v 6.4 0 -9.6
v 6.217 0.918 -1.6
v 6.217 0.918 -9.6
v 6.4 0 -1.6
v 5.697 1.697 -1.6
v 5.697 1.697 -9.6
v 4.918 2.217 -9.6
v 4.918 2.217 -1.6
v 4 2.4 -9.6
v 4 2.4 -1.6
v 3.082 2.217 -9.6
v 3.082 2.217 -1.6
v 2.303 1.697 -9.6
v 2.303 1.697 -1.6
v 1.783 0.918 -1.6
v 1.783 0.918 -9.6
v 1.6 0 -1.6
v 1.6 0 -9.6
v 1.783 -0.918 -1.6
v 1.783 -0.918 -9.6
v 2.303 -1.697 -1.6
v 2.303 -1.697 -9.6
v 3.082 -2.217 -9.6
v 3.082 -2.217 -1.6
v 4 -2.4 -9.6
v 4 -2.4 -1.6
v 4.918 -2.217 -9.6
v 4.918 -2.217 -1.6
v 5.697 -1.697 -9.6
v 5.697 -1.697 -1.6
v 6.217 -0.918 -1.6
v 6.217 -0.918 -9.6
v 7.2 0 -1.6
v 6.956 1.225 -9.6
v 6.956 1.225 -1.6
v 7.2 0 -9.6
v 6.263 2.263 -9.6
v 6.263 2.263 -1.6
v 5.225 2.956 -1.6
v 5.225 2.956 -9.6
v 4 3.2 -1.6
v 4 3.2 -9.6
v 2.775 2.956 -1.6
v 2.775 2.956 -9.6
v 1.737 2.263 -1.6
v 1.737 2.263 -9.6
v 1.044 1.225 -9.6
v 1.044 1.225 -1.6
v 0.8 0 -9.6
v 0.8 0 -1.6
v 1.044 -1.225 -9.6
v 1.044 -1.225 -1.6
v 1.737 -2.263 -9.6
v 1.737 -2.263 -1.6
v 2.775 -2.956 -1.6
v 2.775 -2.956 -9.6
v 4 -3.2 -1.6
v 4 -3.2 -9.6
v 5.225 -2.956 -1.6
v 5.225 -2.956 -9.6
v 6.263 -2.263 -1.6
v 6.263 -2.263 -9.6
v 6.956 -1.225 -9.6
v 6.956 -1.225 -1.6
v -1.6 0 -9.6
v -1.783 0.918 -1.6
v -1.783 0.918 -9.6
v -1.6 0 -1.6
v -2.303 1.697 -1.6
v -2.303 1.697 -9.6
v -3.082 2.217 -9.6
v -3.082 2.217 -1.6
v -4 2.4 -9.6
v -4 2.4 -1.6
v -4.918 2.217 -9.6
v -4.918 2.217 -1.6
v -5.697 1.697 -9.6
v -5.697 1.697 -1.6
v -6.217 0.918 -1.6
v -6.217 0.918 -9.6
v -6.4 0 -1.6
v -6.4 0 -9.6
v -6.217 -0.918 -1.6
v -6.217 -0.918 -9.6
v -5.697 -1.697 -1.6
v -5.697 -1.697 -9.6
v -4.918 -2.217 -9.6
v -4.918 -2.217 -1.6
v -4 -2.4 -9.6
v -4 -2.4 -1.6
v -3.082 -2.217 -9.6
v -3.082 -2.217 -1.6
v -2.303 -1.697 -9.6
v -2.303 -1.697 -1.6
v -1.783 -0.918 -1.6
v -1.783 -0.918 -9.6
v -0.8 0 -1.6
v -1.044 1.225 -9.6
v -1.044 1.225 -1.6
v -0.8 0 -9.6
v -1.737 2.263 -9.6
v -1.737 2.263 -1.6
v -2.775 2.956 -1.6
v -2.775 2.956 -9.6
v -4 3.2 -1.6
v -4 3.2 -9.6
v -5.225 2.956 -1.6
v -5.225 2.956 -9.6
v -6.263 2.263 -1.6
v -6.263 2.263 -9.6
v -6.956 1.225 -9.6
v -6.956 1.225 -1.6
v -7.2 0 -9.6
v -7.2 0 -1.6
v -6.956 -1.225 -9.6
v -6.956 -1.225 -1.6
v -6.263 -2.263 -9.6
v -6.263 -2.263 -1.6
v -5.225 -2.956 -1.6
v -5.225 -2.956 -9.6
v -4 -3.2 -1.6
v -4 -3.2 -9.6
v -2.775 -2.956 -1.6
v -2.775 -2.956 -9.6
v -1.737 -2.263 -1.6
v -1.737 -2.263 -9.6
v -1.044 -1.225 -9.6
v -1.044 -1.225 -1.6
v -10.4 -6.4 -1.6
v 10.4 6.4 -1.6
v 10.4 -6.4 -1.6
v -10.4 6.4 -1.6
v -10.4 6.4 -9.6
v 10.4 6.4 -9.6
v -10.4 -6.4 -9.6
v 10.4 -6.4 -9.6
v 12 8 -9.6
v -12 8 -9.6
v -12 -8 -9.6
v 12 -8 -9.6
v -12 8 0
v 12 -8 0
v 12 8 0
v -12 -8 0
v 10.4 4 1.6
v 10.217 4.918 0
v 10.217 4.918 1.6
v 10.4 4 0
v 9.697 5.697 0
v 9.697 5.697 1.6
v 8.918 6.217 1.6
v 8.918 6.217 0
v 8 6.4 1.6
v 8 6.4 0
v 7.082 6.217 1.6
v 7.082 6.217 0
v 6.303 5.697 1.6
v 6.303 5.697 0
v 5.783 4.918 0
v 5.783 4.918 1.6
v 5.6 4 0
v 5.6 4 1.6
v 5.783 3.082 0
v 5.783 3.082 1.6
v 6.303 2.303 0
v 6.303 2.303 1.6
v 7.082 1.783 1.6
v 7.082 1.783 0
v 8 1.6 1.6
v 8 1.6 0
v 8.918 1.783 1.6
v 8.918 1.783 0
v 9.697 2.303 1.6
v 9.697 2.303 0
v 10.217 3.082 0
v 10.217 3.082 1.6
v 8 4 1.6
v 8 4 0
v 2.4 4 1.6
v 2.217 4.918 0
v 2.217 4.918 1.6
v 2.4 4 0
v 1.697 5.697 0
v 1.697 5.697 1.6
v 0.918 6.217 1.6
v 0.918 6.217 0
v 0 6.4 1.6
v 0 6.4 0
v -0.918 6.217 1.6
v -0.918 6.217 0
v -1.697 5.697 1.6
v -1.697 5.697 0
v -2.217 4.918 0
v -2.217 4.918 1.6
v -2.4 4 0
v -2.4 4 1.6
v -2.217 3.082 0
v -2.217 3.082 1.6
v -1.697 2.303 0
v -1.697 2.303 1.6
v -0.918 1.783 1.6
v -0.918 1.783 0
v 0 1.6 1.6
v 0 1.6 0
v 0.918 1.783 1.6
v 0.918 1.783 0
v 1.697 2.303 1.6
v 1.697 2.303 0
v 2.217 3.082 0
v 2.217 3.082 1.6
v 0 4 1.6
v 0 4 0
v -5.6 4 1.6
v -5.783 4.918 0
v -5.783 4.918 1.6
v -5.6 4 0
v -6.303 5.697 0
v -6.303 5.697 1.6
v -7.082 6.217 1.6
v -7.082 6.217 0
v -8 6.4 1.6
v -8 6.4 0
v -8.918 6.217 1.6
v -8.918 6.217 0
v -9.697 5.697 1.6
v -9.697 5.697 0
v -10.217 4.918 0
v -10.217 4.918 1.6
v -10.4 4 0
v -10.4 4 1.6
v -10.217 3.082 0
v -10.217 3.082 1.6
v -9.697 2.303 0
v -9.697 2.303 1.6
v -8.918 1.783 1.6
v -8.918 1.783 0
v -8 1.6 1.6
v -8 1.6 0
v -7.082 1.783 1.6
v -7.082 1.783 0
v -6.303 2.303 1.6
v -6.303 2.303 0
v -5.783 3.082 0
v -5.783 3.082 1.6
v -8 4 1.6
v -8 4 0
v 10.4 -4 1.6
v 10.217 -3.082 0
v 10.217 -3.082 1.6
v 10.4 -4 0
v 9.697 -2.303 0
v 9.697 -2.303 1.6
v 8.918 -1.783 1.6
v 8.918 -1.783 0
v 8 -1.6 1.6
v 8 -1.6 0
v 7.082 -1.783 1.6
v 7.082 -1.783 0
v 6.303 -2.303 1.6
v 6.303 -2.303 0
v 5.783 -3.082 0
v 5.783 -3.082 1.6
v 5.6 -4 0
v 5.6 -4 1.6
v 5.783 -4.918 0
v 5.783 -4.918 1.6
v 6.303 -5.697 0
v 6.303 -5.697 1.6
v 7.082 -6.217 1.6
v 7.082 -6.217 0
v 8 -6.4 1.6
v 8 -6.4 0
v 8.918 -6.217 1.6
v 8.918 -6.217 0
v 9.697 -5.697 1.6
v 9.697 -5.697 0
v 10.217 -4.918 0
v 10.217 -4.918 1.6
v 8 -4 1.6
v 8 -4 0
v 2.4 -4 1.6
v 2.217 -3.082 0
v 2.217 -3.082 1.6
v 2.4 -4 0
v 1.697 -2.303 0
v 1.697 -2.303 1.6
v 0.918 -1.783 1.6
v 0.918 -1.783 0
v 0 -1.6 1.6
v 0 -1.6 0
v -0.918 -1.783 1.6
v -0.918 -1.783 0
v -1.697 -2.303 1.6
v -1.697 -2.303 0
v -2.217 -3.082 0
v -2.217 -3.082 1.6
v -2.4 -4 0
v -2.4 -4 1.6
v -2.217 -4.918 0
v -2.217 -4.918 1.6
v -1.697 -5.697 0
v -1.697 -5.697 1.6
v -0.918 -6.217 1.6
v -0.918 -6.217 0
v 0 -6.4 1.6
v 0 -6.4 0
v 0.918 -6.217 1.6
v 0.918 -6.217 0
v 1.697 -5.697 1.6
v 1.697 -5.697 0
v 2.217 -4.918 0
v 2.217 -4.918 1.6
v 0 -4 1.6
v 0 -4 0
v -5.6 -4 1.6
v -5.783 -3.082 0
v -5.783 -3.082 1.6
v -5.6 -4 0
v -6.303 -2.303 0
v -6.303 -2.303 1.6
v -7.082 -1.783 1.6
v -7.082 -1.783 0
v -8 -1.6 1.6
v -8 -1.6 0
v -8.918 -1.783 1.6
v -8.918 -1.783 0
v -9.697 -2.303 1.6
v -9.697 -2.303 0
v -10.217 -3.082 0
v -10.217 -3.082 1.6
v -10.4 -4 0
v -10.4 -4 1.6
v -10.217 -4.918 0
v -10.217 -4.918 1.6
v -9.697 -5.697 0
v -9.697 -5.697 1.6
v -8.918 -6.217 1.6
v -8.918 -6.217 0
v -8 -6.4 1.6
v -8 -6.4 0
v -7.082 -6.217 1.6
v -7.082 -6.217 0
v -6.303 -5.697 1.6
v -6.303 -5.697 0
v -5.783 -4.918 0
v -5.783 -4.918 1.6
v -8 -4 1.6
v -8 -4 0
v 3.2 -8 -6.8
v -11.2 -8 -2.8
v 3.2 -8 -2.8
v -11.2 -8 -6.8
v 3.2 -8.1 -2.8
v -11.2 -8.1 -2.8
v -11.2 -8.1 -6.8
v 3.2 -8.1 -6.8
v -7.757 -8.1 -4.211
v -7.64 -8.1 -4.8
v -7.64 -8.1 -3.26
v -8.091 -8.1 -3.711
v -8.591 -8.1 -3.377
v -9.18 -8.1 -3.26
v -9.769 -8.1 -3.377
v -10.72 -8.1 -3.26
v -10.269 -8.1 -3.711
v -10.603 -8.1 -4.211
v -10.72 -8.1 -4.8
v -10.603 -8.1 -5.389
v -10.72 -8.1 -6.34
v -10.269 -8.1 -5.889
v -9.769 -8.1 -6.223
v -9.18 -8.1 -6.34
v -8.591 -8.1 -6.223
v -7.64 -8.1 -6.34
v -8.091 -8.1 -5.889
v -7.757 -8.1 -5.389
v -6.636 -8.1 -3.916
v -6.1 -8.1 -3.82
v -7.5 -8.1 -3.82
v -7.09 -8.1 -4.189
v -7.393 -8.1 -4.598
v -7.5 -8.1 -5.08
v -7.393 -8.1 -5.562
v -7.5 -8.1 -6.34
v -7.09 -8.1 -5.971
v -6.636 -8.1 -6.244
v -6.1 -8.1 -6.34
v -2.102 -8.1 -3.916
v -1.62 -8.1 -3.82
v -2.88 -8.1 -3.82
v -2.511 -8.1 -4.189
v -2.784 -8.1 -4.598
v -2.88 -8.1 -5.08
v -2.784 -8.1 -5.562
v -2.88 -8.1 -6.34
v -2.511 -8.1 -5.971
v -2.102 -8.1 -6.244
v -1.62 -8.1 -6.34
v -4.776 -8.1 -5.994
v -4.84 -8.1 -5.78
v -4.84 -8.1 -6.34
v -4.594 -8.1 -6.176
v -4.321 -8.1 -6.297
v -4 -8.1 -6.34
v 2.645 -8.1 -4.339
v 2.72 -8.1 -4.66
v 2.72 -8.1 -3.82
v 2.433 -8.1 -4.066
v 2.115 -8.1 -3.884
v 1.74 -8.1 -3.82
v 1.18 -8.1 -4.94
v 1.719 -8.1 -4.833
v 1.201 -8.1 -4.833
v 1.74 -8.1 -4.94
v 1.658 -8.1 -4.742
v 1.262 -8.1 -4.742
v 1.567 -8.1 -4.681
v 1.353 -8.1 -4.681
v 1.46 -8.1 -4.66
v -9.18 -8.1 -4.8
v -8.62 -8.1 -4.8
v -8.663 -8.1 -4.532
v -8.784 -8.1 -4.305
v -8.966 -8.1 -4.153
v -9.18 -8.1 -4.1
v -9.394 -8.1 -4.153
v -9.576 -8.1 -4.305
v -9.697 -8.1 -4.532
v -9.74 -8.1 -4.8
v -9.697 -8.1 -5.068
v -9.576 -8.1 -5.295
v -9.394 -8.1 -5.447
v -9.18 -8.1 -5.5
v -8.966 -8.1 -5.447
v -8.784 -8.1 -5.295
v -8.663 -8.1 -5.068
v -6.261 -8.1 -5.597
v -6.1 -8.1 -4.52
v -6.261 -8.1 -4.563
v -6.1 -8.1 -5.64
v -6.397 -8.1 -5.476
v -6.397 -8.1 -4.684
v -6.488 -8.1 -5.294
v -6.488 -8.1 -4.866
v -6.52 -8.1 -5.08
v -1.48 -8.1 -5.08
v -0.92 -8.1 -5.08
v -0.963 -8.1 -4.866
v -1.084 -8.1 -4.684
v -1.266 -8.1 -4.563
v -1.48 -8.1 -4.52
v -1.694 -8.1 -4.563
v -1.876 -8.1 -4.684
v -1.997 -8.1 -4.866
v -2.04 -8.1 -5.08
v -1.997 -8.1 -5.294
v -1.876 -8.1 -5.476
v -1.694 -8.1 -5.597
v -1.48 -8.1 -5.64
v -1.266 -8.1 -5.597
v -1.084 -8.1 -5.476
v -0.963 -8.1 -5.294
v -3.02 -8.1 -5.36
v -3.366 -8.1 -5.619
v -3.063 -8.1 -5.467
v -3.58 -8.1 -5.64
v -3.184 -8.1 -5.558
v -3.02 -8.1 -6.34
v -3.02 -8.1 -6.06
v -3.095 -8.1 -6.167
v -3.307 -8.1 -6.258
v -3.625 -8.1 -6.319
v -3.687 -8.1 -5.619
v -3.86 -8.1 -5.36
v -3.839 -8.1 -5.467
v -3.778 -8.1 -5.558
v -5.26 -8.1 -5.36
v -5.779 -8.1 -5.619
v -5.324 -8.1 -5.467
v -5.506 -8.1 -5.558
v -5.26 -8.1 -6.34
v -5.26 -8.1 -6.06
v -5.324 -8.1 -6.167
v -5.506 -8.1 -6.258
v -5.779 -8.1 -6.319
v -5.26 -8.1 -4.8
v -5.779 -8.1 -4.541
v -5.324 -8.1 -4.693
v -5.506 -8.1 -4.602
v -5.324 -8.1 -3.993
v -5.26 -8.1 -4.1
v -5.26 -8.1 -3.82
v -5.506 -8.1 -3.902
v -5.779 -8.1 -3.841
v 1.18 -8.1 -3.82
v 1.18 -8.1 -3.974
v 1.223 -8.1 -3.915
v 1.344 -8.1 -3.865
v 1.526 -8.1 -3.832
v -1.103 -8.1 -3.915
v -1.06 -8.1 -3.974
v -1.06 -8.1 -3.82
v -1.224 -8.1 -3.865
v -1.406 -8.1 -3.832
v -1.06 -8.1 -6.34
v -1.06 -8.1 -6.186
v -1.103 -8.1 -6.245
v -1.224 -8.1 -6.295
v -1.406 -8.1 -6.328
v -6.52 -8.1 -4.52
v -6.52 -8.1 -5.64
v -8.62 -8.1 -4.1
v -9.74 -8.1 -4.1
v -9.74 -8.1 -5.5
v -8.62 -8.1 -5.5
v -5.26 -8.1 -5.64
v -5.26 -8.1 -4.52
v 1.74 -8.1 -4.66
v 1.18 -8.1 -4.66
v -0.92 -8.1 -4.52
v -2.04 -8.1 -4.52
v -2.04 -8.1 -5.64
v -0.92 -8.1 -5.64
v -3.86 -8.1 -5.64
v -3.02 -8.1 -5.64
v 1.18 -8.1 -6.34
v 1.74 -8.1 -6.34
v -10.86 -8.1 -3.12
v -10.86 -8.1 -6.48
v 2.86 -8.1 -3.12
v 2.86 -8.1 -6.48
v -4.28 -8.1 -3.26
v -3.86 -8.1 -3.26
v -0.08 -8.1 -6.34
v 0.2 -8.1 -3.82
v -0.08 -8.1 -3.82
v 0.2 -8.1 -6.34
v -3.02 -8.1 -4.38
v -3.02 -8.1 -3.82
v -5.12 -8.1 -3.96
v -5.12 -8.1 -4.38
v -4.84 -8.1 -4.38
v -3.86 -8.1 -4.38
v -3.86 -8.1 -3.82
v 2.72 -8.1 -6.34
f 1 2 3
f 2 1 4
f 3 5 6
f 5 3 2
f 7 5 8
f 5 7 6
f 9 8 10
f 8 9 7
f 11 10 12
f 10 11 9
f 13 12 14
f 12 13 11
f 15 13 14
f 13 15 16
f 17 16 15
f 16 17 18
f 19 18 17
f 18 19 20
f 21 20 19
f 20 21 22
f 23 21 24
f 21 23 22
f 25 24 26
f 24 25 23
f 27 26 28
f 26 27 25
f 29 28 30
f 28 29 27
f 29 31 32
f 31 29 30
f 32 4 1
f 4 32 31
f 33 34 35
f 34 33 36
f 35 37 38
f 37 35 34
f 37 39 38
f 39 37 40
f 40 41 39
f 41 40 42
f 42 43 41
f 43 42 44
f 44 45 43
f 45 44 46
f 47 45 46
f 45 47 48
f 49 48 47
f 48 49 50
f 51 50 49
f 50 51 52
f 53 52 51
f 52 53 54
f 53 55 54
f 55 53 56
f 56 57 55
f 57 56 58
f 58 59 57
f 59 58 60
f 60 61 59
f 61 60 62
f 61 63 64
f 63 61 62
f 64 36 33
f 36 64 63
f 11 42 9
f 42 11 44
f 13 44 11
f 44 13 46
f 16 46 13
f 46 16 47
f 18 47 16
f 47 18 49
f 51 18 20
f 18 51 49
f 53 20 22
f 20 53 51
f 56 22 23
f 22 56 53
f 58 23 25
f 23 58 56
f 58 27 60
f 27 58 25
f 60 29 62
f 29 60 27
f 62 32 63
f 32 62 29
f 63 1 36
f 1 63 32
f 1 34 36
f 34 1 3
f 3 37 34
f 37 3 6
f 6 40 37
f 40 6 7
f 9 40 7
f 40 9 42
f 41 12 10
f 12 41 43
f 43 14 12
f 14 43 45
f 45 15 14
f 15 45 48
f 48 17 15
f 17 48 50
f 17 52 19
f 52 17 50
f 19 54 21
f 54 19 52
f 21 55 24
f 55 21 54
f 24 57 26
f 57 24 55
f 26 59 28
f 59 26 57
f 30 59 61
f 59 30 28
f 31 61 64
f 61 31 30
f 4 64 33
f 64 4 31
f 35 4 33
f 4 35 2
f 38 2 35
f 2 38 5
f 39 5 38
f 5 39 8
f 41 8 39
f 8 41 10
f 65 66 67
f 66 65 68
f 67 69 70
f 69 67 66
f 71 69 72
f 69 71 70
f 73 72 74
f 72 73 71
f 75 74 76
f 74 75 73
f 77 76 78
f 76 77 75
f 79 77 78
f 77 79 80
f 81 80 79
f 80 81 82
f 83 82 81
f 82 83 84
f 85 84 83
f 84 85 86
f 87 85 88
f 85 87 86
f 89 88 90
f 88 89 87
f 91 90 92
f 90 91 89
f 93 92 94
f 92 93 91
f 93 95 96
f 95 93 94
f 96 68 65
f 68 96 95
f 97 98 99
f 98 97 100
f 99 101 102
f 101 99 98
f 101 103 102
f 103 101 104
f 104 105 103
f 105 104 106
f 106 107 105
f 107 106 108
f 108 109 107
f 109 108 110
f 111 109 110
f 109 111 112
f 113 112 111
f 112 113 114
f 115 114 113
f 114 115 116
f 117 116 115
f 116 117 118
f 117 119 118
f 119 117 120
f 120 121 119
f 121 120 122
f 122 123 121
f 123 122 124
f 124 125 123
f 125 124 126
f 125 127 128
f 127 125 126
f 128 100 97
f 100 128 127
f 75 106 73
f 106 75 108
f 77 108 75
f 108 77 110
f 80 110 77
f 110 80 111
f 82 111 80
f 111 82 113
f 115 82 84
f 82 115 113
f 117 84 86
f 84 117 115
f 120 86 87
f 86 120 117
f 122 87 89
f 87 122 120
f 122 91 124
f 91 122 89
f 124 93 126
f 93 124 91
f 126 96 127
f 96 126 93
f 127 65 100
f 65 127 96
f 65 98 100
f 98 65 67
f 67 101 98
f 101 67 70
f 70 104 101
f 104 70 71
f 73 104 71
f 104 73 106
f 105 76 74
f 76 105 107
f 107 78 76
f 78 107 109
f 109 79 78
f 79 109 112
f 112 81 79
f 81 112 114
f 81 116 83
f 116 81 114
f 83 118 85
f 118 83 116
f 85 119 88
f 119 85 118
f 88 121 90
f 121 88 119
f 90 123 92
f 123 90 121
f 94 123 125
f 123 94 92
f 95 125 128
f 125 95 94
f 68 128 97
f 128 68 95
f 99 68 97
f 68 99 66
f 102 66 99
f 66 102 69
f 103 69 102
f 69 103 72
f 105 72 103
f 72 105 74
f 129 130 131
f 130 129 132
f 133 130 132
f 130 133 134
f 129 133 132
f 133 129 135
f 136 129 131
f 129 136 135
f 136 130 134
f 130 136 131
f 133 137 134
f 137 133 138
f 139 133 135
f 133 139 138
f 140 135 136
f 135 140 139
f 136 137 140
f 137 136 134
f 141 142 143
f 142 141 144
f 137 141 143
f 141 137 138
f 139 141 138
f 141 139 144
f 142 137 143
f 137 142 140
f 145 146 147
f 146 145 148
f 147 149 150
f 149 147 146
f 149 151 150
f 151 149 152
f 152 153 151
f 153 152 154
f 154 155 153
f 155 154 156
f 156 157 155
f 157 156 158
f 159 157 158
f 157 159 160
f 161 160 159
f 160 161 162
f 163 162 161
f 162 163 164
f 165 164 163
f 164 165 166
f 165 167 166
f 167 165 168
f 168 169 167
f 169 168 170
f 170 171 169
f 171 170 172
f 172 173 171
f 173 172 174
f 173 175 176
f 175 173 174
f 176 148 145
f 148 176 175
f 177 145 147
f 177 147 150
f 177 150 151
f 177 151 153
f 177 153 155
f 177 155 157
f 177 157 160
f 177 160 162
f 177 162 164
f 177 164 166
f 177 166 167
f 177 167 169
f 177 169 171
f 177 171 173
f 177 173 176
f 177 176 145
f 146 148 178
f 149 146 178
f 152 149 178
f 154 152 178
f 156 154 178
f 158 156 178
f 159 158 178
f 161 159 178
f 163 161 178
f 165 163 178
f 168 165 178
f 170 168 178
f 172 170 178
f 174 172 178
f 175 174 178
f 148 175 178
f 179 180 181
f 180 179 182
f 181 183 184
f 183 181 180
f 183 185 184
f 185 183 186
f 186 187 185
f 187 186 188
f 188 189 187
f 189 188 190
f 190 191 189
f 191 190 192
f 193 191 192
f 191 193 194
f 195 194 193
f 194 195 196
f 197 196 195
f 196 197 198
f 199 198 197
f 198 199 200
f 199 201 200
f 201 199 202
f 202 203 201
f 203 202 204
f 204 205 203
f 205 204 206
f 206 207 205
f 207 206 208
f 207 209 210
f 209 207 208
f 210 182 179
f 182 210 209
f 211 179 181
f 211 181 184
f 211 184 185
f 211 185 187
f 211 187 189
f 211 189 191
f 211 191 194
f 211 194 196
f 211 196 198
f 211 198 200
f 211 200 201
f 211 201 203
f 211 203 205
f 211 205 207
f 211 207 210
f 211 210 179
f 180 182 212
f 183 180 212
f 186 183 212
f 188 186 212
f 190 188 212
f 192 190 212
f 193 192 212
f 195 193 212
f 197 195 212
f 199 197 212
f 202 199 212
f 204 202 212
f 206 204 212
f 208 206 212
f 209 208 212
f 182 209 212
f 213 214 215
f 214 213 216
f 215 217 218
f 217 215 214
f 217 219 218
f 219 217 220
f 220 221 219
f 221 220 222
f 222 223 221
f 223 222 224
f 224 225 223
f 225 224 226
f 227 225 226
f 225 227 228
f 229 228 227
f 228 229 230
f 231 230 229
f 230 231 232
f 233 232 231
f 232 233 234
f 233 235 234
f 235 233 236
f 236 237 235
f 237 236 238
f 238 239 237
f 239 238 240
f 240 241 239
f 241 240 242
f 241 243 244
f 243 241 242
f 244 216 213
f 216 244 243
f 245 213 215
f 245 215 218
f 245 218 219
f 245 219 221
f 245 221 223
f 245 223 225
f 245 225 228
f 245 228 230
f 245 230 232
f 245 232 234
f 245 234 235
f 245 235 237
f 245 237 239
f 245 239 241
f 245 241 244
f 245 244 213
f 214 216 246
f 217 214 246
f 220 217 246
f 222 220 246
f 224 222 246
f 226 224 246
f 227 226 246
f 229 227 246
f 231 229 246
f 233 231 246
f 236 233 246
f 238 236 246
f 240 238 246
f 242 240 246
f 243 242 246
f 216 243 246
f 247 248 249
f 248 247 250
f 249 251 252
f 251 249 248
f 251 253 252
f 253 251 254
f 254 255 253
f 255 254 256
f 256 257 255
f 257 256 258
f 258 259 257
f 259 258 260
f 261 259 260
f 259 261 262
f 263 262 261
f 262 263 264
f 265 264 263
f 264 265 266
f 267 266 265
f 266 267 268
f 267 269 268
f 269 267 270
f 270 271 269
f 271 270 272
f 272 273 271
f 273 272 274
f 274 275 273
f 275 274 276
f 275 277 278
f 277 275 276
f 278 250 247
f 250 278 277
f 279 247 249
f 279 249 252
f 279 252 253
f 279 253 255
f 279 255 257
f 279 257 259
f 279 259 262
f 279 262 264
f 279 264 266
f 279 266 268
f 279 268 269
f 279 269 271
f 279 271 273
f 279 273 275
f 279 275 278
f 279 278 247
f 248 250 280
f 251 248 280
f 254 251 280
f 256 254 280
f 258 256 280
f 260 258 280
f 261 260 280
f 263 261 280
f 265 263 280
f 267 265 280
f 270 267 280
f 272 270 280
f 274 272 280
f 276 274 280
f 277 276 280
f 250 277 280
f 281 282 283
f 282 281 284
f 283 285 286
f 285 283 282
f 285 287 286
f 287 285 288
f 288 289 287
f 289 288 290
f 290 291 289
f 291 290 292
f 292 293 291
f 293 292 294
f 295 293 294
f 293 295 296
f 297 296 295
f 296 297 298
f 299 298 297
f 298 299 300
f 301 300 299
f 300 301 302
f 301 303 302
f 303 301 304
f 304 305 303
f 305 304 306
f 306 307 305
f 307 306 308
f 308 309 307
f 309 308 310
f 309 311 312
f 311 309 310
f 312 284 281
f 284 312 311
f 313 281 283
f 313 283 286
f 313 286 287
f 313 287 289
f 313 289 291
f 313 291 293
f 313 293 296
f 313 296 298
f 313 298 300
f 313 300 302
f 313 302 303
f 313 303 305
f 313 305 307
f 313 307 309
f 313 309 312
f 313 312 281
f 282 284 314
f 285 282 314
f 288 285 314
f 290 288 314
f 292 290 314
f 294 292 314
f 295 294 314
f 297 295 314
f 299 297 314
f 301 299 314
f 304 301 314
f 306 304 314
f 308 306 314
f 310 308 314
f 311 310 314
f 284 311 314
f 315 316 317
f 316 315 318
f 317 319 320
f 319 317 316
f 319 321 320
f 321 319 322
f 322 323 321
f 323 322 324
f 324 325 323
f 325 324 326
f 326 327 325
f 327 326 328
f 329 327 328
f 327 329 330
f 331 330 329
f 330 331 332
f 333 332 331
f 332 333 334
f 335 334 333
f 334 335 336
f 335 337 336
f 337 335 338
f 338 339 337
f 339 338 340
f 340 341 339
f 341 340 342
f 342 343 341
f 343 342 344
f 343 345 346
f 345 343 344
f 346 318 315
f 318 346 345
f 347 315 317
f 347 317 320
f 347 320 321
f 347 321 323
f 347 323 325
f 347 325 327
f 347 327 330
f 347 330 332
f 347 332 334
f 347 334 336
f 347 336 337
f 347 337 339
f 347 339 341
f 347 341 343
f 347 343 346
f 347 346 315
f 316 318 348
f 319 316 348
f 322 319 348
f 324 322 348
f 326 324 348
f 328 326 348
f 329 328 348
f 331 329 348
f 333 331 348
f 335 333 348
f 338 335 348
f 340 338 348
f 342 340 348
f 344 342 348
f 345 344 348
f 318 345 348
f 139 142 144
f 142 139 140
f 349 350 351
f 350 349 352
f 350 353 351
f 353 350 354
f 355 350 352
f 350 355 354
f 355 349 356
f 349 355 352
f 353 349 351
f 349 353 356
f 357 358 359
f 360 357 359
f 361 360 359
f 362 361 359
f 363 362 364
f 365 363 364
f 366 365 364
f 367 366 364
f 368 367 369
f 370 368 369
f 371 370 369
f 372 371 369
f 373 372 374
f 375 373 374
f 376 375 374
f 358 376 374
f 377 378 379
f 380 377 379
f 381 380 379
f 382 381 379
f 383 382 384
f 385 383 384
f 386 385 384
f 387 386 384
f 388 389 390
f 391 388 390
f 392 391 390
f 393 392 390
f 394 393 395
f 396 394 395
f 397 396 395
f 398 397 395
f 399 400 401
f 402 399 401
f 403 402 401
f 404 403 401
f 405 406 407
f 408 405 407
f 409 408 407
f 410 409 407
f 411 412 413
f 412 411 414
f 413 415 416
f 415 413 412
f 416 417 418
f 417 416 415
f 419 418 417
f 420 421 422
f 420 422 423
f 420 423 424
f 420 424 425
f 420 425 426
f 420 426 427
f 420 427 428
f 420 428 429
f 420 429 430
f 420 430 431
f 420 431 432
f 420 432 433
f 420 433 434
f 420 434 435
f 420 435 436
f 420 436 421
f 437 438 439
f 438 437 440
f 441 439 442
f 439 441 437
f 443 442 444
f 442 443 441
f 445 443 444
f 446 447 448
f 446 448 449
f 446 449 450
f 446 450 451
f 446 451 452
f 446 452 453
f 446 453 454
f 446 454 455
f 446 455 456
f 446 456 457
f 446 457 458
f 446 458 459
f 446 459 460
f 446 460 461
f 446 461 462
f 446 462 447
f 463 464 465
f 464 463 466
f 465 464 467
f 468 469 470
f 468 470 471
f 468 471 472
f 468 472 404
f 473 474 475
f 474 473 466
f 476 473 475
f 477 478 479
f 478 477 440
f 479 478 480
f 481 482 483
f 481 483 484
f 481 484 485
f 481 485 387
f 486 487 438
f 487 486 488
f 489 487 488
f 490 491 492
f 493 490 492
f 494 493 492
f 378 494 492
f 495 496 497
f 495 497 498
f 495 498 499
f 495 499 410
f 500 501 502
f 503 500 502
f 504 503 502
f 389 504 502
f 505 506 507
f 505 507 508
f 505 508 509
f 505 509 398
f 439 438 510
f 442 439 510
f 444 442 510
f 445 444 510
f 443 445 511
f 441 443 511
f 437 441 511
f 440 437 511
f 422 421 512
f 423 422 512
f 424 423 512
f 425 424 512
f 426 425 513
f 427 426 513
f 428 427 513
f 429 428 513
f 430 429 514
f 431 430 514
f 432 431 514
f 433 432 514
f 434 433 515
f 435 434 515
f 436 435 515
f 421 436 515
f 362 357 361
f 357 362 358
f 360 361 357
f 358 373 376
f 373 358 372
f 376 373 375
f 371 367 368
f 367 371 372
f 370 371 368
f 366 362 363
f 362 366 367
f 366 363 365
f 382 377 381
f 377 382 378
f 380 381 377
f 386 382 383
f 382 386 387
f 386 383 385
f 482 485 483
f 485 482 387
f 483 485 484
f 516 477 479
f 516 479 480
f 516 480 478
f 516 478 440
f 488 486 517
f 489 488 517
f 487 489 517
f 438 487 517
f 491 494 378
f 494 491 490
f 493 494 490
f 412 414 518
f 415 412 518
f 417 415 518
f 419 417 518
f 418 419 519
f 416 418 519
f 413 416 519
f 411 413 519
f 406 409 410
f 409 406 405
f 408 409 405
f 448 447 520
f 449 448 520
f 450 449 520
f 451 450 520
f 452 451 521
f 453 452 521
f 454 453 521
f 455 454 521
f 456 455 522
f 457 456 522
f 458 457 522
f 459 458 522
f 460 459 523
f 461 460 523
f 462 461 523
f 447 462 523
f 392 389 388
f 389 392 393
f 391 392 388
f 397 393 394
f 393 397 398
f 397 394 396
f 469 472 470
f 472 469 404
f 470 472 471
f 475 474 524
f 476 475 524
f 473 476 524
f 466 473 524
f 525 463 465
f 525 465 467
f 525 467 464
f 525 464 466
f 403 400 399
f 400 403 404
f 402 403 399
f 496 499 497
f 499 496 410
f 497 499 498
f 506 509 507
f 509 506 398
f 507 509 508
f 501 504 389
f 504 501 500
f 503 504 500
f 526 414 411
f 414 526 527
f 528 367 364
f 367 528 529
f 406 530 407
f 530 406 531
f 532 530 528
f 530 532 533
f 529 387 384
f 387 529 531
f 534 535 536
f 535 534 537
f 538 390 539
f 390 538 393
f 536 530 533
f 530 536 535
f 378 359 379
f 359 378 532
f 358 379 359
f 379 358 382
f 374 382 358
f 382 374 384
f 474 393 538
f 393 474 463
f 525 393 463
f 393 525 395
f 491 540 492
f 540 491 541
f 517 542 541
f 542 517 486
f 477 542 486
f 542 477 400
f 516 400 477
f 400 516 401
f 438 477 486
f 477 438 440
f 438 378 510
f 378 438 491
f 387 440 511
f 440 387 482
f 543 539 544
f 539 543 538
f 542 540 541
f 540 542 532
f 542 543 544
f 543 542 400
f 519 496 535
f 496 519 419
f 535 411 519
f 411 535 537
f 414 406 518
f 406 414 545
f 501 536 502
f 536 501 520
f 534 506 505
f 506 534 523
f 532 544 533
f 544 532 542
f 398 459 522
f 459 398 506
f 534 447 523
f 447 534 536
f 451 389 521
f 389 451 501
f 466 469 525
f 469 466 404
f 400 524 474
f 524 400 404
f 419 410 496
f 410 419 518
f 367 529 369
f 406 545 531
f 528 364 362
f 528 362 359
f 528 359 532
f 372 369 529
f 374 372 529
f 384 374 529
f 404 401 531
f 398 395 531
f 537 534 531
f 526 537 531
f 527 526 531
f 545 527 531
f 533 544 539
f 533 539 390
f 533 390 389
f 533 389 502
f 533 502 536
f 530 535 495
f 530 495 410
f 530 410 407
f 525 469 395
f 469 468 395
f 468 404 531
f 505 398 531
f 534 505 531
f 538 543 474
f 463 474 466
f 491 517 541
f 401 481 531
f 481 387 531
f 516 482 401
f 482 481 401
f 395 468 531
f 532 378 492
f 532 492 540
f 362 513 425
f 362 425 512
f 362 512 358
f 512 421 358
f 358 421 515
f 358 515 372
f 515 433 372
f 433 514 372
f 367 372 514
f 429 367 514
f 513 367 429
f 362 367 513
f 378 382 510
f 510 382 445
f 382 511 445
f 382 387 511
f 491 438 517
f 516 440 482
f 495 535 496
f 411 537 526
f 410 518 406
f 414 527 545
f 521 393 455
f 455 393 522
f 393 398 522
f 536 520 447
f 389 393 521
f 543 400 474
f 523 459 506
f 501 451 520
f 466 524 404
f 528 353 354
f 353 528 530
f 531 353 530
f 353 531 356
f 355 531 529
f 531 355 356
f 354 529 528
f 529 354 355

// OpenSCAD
use <../lib.scad>
use <165495c.scad>
use <3002.scad>
function ldraw_lib__3002d05() = [
// 0 Brick  2 x  3 with Octan Left Sticker
// 0 Name: 3002d05.dat
// 0 Author: Takeshi Takahashi [RainbowDolphin]
// 0 !LDRAW_ORG Shortcut UPDATE 2024-10
// 0 !LICENSE Licensed under CC BY 4.0 : see CAreadme.txt
// 
// 0 BFC CERTIFY CCW
  [0,"BFC","CERTIFY"],
  [0,"BFC","CCW"],
// 
// 0 !CATEGORY Sticker Shortcut
// 0 !KEYWORDS Bricklink 3002pb37L, Gas Station, Set 6397
// 
// 0 !HISTORY 2024-12-01 [OrionP] Official Update 2024-10
// 
// 1 16 0 0 0 1 0 0 0 1 0 0 0 1 3002.dat
  [1,16,0,0,0,1,0,0,0,1,0,0,0,1, ldraw_lib__3002()],
// 1 16 -10 12 -20 1 0 0 0 0 -1 0 1 0 165495c.dat
  [1,16,-10,12,-20,1,0,0,0,0,-1,0,1,0, ldraw_lib__165495c()],
];
module ldraw_lib__3002d05(step=0, col=false, unit=2/5, alt=false, line=0.2, solid=!$preview)
    makepoly(ldraw_lib__3002d05(), step=step, col=col, unit=unit, alt=alt, line=line, solid=solid);
ldraw_lib__3002d05(line=0.2);
